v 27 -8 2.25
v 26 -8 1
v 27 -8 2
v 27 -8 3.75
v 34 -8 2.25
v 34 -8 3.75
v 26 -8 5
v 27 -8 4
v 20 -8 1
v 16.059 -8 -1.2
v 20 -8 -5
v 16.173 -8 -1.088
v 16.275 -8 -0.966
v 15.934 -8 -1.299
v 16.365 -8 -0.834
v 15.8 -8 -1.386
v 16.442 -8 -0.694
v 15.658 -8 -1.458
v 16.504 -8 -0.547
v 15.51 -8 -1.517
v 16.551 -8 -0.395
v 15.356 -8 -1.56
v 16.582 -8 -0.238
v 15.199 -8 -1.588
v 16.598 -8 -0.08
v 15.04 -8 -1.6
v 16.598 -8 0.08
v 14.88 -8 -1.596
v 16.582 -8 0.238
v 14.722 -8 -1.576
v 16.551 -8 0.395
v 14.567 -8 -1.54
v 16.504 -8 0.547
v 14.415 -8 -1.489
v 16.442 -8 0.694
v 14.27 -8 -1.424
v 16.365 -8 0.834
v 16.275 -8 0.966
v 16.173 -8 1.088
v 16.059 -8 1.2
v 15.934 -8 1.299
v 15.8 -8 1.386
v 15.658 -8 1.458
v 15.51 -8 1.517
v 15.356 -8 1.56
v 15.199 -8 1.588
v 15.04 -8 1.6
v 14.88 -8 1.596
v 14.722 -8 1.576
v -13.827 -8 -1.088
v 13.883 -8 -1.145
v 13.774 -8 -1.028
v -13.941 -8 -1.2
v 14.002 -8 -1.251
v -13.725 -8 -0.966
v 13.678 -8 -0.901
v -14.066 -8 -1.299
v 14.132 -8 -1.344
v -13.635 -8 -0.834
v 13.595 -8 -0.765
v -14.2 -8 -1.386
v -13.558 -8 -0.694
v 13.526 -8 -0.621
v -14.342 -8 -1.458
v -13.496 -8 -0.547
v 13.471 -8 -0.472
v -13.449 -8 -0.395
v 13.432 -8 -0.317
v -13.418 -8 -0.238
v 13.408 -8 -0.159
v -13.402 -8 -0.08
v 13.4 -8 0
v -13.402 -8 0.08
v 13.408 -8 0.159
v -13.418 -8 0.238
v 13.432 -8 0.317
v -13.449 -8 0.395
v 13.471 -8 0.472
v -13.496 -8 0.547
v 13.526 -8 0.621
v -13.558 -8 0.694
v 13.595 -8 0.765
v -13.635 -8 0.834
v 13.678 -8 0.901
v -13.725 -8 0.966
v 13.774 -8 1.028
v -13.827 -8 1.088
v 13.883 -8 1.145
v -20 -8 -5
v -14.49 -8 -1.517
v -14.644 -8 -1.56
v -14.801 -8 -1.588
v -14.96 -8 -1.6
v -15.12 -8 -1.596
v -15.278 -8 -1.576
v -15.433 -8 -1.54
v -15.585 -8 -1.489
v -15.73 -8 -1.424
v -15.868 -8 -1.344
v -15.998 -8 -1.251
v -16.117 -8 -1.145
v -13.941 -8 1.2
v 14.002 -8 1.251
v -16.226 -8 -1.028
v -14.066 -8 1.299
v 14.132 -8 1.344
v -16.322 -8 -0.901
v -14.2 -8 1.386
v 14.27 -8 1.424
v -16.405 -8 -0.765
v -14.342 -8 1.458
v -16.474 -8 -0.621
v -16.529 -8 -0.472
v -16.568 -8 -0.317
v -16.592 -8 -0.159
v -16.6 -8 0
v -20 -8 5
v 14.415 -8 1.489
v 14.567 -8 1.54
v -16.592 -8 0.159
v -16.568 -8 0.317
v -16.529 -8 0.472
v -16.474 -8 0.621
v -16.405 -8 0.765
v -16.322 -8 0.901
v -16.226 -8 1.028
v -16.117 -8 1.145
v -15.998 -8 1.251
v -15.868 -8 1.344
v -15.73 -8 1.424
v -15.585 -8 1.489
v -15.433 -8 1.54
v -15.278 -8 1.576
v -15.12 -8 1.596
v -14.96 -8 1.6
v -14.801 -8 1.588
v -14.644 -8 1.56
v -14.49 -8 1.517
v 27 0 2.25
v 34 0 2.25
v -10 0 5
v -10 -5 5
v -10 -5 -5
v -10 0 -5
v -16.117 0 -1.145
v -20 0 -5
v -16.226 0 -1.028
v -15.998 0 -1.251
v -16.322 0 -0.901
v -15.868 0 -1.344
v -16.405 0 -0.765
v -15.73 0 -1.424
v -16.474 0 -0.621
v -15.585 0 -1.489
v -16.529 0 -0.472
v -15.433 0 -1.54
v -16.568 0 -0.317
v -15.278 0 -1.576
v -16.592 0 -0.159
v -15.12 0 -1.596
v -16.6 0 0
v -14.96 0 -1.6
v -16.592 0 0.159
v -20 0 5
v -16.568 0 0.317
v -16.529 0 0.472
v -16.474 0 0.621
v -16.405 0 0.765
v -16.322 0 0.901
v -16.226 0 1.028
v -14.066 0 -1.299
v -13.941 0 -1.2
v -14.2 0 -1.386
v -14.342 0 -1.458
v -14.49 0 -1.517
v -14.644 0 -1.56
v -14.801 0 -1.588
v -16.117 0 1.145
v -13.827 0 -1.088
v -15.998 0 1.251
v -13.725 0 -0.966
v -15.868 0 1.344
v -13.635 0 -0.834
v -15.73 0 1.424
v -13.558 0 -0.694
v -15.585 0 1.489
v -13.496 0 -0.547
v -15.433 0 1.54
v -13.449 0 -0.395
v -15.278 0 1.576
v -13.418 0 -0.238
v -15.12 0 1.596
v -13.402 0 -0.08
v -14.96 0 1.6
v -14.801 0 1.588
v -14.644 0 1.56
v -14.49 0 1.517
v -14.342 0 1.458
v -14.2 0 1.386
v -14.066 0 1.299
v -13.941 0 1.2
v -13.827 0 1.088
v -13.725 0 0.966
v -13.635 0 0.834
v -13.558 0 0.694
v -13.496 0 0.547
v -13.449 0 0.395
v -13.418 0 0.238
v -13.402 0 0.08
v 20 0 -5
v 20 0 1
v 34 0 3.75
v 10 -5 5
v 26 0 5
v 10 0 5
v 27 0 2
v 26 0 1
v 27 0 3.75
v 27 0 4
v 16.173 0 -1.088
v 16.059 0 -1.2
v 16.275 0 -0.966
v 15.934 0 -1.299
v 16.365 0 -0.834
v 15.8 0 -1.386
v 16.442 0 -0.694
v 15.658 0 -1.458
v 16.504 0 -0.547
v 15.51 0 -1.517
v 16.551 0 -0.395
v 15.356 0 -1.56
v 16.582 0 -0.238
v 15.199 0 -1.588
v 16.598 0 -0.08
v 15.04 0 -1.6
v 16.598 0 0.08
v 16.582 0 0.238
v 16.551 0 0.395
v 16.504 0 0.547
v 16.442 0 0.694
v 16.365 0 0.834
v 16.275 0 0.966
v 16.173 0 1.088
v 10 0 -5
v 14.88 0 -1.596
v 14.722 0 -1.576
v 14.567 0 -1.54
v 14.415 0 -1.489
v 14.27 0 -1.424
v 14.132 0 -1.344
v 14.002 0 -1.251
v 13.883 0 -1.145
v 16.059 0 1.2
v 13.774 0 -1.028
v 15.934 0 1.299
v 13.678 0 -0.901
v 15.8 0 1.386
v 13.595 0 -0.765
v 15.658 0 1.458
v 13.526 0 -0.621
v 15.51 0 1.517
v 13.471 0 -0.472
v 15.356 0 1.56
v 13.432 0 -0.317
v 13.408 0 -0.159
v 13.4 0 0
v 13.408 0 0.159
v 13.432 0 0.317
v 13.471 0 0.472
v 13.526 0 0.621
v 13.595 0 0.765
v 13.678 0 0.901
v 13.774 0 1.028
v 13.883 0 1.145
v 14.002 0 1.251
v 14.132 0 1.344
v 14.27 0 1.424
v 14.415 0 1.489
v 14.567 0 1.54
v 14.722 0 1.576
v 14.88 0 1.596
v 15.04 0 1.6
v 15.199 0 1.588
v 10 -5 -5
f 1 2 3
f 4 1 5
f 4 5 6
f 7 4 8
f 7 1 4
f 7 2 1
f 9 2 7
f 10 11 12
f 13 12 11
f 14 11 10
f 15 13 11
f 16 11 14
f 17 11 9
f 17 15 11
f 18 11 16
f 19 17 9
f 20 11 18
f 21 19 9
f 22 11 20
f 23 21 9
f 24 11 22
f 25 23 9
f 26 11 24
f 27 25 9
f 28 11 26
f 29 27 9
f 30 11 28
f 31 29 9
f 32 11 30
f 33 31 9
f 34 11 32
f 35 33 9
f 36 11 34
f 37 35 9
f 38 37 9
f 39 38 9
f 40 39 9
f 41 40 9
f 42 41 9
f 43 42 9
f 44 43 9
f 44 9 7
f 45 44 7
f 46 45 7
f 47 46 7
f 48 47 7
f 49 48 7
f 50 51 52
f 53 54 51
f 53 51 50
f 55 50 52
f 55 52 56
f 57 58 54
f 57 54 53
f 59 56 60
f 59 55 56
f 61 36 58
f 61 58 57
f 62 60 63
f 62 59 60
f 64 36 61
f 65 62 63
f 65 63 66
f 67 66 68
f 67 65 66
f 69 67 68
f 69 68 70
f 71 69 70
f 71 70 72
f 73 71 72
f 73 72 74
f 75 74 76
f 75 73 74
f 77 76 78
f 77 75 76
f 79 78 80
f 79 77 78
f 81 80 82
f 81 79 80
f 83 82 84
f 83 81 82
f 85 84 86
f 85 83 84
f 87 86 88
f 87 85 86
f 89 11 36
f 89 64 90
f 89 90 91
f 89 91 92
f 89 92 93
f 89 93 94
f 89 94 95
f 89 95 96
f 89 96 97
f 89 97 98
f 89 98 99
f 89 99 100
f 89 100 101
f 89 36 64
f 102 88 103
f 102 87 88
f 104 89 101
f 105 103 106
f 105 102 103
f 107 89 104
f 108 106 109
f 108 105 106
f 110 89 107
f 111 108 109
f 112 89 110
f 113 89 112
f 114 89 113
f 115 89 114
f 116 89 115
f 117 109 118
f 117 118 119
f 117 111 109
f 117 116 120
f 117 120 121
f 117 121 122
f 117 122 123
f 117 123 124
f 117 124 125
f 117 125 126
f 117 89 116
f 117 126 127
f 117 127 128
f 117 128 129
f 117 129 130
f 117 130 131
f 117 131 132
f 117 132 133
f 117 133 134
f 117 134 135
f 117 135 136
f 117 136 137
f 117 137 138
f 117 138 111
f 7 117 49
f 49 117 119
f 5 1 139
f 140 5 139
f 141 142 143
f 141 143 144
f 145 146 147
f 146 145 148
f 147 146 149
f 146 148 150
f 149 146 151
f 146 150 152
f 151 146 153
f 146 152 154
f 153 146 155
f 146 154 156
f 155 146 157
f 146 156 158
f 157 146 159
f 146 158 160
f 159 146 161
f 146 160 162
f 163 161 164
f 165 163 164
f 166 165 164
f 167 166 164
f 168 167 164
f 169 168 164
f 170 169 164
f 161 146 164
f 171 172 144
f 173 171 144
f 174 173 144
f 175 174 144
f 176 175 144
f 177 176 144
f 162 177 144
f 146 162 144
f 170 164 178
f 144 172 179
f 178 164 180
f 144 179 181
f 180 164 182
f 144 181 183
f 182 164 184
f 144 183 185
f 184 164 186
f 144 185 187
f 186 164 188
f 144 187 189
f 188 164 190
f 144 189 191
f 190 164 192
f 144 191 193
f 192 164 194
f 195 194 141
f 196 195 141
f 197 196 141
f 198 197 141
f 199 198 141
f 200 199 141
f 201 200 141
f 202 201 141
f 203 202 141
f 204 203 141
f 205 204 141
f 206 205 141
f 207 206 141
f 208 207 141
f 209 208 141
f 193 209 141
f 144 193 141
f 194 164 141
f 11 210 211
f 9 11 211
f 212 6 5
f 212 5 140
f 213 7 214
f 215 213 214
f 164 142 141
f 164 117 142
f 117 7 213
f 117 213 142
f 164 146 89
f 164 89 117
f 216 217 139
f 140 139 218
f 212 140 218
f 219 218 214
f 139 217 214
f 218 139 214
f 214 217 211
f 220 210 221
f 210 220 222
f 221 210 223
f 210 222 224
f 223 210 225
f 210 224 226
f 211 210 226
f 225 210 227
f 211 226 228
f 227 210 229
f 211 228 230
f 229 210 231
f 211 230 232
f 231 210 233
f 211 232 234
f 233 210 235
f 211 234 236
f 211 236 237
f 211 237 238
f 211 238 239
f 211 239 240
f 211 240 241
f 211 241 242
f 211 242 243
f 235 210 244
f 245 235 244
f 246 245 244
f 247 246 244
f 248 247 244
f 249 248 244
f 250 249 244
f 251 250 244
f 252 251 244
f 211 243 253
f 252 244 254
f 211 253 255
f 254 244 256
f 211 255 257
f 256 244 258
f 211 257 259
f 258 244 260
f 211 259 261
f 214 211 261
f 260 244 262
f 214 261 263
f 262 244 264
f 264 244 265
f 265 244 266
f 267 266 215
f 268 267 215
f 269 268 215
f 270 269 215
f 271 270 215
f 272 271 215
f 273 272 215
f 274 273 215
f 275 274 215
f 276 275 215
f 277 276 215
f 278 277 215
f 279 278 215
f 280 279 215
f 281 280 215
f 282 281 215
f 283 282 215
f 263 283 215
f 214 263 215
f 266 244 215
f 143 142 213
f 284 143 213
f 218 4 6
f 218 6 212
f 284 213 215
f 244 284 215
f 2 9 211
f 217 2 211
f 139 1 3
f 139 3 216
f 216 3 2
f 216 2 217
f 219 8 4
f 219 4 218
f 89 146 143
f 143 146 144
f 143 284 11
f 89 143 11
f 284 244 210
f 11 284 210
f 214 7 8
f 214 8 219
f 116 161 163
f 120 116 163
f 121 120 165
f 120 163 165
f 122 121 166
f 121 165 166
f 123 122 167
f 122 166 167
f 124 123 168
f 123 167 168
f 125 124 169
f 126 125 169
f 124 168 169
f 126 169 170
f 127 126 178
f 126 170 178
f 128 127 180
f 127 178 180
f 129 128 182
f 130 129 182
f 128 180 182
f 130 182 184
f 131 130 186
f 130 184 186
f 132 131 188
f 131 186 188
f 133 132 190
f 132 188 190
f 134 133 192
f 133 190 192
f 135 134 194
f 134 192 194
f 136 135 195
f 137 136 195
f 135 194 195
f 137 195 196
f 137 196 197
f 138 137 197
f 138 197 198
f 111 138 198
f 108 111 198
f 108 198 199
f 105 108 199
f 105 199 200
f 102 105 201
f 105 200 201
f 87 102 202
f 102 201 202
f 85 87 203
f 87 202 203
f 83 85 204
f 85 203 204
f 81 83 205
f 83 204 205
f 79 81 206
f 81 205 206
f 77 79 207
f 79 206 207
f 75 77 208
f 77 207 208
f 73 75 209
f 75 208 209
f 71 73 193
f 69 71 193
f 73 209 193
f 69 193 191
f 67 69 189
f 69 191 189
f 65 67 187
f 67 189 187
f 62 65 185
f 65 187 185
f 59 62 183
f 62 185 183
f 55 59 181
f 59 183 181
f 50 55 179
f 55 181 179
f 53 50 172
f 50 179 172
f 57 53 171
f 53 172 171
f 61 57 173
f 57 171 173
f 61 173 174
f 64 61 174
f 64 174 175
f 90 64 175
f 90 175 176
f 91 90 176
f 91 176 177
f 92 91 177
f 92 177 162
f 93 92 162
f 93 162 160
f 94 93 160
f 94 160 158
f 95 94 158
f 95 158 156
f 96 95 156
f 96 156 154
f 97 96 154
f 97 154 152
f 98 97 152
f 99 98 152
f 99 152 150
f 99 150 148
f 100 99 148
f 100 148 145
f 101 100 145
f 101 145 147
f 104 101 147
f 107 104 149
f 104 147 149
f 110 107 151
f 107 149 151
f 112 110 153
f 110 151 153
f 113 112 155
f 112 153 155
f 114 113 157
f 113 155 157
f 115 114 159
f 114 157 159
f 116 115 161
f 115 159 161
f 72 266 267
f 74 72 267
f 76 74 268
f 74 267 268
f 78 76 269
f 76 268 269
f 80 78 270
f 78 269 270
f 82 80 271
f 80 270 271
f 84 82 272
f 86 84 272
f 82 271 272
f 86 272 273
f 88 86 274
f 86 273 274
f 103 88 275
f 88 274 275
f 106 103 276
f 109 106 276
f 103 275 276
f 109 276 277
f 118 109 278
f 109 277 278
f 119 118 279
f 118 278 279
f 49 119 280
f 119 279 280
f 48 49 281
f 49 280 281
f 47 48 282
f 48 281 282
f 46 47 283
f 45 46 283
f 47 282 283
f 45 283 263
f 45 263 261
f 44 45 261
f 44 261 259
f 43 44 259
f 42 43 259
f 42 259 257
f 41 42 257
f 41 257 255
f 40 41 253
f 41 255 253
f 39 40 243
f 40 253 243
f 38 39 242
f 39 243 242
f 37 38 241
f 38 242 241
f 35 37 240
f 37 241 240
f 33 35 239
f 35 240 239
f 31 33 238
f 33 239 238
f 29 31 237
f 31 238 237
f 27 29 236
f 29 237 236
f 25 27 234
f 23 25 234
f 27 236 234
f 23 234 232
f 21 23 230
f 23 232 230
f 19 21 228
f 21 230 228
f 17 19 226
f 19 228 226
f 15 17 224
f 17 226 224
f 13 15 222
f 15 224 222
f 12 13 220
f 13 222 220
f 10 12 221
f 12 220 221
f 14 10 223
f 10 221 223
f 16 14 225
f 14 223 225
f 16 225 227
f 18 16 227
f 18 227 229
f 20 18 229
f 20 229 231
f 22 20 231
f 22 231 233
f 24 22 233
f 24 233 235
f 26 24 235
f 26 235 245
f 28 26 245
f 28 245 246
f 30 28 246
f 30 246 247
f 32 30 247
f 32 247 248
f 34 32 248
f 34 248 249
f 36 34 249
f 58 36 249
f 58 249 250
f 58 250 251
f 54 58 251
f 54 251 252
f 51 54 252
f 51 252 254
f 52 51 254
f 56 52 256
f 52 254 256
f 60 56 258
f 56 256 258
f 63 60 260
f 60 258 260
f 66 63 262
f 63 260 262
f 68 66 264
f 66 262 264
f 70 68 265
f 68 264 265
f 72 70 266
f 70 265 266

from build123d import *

# Parameters (mm, degrees)
F0_W      = 40
F0_H      = 10
F1_DEPTH  = 8
F2_W      = 20
F2_H      = 5
F3_DEPTH  = 10
F4_R      = 1.6
F5_R      = 1.6
F6_DEPTH  = 8
F7_W      = 8
F7_H      = 4
F8_DEPTH  = 7
F9_W      = 8
F9_H      = 1.5
F10_DEPTH = 7
F11_SIZE  = 1


with BuildPart() as f1:
    # F0 (on Front) → F1 (new body)
    with BuildSketch(Plane.XZ):
        Rectangle(F0_W, F0_H)
    extrude(amount=F1_DEPTH)

    # F2 (on face) → F3 (cut, through all)
    with BuildSketch(Plane.XY.offset(5)):
        with Locations((0, -2.5)):
            Rectangle(F2_W, F2_H)
    extrude(amount=-F3_DEPTH, mode=Mode.SUBTRACT)

    # F4 (on face) + F5 (on face) → F6 (cut, through all)
    with BuildSketch(Plane(origin=(0, 0, 0), x_dir=(-1, 0, 0), z_dir=(0, 1, 0))):
        with Locations((-15, 0)):
            Circle(F4_R)
    with BuildSketch(Plane(origin=(0, 0, 0), x_dir=(-1, 0, 0), z_dir=(0, 1, 0))):
        with Locations((15, 0)):
            Circle(F5_R)
    extrude(amount=-F6_DEPTH, mode=Mode.SUBTRACT)

    # F7 (on face) → F8 (join)
    with BuildSketch(Plane.YZ.offset(20)):
        with Locations((-4, 3)):
            Rectangle(F7_W, F7_H)
    extrude(amount=F8_DEPTH)

    # F9 (on face) → F10 (join)
    with BuildSketch(Plane.YZ.offset(27)):
        with Locations((-4, 3)):
            Rectangle(F9_W, F9_H)
    extrude(amount=F10_DEPTH)

    # F11
    f11_edges = [f1.edges().sort_by_distance(p)[0] for p in [
        (27, -4, 1),
        (27, -4, 5),
    ]]
    chamfer(f11_edges, length=F11_SIZE)


solid = f1.part
